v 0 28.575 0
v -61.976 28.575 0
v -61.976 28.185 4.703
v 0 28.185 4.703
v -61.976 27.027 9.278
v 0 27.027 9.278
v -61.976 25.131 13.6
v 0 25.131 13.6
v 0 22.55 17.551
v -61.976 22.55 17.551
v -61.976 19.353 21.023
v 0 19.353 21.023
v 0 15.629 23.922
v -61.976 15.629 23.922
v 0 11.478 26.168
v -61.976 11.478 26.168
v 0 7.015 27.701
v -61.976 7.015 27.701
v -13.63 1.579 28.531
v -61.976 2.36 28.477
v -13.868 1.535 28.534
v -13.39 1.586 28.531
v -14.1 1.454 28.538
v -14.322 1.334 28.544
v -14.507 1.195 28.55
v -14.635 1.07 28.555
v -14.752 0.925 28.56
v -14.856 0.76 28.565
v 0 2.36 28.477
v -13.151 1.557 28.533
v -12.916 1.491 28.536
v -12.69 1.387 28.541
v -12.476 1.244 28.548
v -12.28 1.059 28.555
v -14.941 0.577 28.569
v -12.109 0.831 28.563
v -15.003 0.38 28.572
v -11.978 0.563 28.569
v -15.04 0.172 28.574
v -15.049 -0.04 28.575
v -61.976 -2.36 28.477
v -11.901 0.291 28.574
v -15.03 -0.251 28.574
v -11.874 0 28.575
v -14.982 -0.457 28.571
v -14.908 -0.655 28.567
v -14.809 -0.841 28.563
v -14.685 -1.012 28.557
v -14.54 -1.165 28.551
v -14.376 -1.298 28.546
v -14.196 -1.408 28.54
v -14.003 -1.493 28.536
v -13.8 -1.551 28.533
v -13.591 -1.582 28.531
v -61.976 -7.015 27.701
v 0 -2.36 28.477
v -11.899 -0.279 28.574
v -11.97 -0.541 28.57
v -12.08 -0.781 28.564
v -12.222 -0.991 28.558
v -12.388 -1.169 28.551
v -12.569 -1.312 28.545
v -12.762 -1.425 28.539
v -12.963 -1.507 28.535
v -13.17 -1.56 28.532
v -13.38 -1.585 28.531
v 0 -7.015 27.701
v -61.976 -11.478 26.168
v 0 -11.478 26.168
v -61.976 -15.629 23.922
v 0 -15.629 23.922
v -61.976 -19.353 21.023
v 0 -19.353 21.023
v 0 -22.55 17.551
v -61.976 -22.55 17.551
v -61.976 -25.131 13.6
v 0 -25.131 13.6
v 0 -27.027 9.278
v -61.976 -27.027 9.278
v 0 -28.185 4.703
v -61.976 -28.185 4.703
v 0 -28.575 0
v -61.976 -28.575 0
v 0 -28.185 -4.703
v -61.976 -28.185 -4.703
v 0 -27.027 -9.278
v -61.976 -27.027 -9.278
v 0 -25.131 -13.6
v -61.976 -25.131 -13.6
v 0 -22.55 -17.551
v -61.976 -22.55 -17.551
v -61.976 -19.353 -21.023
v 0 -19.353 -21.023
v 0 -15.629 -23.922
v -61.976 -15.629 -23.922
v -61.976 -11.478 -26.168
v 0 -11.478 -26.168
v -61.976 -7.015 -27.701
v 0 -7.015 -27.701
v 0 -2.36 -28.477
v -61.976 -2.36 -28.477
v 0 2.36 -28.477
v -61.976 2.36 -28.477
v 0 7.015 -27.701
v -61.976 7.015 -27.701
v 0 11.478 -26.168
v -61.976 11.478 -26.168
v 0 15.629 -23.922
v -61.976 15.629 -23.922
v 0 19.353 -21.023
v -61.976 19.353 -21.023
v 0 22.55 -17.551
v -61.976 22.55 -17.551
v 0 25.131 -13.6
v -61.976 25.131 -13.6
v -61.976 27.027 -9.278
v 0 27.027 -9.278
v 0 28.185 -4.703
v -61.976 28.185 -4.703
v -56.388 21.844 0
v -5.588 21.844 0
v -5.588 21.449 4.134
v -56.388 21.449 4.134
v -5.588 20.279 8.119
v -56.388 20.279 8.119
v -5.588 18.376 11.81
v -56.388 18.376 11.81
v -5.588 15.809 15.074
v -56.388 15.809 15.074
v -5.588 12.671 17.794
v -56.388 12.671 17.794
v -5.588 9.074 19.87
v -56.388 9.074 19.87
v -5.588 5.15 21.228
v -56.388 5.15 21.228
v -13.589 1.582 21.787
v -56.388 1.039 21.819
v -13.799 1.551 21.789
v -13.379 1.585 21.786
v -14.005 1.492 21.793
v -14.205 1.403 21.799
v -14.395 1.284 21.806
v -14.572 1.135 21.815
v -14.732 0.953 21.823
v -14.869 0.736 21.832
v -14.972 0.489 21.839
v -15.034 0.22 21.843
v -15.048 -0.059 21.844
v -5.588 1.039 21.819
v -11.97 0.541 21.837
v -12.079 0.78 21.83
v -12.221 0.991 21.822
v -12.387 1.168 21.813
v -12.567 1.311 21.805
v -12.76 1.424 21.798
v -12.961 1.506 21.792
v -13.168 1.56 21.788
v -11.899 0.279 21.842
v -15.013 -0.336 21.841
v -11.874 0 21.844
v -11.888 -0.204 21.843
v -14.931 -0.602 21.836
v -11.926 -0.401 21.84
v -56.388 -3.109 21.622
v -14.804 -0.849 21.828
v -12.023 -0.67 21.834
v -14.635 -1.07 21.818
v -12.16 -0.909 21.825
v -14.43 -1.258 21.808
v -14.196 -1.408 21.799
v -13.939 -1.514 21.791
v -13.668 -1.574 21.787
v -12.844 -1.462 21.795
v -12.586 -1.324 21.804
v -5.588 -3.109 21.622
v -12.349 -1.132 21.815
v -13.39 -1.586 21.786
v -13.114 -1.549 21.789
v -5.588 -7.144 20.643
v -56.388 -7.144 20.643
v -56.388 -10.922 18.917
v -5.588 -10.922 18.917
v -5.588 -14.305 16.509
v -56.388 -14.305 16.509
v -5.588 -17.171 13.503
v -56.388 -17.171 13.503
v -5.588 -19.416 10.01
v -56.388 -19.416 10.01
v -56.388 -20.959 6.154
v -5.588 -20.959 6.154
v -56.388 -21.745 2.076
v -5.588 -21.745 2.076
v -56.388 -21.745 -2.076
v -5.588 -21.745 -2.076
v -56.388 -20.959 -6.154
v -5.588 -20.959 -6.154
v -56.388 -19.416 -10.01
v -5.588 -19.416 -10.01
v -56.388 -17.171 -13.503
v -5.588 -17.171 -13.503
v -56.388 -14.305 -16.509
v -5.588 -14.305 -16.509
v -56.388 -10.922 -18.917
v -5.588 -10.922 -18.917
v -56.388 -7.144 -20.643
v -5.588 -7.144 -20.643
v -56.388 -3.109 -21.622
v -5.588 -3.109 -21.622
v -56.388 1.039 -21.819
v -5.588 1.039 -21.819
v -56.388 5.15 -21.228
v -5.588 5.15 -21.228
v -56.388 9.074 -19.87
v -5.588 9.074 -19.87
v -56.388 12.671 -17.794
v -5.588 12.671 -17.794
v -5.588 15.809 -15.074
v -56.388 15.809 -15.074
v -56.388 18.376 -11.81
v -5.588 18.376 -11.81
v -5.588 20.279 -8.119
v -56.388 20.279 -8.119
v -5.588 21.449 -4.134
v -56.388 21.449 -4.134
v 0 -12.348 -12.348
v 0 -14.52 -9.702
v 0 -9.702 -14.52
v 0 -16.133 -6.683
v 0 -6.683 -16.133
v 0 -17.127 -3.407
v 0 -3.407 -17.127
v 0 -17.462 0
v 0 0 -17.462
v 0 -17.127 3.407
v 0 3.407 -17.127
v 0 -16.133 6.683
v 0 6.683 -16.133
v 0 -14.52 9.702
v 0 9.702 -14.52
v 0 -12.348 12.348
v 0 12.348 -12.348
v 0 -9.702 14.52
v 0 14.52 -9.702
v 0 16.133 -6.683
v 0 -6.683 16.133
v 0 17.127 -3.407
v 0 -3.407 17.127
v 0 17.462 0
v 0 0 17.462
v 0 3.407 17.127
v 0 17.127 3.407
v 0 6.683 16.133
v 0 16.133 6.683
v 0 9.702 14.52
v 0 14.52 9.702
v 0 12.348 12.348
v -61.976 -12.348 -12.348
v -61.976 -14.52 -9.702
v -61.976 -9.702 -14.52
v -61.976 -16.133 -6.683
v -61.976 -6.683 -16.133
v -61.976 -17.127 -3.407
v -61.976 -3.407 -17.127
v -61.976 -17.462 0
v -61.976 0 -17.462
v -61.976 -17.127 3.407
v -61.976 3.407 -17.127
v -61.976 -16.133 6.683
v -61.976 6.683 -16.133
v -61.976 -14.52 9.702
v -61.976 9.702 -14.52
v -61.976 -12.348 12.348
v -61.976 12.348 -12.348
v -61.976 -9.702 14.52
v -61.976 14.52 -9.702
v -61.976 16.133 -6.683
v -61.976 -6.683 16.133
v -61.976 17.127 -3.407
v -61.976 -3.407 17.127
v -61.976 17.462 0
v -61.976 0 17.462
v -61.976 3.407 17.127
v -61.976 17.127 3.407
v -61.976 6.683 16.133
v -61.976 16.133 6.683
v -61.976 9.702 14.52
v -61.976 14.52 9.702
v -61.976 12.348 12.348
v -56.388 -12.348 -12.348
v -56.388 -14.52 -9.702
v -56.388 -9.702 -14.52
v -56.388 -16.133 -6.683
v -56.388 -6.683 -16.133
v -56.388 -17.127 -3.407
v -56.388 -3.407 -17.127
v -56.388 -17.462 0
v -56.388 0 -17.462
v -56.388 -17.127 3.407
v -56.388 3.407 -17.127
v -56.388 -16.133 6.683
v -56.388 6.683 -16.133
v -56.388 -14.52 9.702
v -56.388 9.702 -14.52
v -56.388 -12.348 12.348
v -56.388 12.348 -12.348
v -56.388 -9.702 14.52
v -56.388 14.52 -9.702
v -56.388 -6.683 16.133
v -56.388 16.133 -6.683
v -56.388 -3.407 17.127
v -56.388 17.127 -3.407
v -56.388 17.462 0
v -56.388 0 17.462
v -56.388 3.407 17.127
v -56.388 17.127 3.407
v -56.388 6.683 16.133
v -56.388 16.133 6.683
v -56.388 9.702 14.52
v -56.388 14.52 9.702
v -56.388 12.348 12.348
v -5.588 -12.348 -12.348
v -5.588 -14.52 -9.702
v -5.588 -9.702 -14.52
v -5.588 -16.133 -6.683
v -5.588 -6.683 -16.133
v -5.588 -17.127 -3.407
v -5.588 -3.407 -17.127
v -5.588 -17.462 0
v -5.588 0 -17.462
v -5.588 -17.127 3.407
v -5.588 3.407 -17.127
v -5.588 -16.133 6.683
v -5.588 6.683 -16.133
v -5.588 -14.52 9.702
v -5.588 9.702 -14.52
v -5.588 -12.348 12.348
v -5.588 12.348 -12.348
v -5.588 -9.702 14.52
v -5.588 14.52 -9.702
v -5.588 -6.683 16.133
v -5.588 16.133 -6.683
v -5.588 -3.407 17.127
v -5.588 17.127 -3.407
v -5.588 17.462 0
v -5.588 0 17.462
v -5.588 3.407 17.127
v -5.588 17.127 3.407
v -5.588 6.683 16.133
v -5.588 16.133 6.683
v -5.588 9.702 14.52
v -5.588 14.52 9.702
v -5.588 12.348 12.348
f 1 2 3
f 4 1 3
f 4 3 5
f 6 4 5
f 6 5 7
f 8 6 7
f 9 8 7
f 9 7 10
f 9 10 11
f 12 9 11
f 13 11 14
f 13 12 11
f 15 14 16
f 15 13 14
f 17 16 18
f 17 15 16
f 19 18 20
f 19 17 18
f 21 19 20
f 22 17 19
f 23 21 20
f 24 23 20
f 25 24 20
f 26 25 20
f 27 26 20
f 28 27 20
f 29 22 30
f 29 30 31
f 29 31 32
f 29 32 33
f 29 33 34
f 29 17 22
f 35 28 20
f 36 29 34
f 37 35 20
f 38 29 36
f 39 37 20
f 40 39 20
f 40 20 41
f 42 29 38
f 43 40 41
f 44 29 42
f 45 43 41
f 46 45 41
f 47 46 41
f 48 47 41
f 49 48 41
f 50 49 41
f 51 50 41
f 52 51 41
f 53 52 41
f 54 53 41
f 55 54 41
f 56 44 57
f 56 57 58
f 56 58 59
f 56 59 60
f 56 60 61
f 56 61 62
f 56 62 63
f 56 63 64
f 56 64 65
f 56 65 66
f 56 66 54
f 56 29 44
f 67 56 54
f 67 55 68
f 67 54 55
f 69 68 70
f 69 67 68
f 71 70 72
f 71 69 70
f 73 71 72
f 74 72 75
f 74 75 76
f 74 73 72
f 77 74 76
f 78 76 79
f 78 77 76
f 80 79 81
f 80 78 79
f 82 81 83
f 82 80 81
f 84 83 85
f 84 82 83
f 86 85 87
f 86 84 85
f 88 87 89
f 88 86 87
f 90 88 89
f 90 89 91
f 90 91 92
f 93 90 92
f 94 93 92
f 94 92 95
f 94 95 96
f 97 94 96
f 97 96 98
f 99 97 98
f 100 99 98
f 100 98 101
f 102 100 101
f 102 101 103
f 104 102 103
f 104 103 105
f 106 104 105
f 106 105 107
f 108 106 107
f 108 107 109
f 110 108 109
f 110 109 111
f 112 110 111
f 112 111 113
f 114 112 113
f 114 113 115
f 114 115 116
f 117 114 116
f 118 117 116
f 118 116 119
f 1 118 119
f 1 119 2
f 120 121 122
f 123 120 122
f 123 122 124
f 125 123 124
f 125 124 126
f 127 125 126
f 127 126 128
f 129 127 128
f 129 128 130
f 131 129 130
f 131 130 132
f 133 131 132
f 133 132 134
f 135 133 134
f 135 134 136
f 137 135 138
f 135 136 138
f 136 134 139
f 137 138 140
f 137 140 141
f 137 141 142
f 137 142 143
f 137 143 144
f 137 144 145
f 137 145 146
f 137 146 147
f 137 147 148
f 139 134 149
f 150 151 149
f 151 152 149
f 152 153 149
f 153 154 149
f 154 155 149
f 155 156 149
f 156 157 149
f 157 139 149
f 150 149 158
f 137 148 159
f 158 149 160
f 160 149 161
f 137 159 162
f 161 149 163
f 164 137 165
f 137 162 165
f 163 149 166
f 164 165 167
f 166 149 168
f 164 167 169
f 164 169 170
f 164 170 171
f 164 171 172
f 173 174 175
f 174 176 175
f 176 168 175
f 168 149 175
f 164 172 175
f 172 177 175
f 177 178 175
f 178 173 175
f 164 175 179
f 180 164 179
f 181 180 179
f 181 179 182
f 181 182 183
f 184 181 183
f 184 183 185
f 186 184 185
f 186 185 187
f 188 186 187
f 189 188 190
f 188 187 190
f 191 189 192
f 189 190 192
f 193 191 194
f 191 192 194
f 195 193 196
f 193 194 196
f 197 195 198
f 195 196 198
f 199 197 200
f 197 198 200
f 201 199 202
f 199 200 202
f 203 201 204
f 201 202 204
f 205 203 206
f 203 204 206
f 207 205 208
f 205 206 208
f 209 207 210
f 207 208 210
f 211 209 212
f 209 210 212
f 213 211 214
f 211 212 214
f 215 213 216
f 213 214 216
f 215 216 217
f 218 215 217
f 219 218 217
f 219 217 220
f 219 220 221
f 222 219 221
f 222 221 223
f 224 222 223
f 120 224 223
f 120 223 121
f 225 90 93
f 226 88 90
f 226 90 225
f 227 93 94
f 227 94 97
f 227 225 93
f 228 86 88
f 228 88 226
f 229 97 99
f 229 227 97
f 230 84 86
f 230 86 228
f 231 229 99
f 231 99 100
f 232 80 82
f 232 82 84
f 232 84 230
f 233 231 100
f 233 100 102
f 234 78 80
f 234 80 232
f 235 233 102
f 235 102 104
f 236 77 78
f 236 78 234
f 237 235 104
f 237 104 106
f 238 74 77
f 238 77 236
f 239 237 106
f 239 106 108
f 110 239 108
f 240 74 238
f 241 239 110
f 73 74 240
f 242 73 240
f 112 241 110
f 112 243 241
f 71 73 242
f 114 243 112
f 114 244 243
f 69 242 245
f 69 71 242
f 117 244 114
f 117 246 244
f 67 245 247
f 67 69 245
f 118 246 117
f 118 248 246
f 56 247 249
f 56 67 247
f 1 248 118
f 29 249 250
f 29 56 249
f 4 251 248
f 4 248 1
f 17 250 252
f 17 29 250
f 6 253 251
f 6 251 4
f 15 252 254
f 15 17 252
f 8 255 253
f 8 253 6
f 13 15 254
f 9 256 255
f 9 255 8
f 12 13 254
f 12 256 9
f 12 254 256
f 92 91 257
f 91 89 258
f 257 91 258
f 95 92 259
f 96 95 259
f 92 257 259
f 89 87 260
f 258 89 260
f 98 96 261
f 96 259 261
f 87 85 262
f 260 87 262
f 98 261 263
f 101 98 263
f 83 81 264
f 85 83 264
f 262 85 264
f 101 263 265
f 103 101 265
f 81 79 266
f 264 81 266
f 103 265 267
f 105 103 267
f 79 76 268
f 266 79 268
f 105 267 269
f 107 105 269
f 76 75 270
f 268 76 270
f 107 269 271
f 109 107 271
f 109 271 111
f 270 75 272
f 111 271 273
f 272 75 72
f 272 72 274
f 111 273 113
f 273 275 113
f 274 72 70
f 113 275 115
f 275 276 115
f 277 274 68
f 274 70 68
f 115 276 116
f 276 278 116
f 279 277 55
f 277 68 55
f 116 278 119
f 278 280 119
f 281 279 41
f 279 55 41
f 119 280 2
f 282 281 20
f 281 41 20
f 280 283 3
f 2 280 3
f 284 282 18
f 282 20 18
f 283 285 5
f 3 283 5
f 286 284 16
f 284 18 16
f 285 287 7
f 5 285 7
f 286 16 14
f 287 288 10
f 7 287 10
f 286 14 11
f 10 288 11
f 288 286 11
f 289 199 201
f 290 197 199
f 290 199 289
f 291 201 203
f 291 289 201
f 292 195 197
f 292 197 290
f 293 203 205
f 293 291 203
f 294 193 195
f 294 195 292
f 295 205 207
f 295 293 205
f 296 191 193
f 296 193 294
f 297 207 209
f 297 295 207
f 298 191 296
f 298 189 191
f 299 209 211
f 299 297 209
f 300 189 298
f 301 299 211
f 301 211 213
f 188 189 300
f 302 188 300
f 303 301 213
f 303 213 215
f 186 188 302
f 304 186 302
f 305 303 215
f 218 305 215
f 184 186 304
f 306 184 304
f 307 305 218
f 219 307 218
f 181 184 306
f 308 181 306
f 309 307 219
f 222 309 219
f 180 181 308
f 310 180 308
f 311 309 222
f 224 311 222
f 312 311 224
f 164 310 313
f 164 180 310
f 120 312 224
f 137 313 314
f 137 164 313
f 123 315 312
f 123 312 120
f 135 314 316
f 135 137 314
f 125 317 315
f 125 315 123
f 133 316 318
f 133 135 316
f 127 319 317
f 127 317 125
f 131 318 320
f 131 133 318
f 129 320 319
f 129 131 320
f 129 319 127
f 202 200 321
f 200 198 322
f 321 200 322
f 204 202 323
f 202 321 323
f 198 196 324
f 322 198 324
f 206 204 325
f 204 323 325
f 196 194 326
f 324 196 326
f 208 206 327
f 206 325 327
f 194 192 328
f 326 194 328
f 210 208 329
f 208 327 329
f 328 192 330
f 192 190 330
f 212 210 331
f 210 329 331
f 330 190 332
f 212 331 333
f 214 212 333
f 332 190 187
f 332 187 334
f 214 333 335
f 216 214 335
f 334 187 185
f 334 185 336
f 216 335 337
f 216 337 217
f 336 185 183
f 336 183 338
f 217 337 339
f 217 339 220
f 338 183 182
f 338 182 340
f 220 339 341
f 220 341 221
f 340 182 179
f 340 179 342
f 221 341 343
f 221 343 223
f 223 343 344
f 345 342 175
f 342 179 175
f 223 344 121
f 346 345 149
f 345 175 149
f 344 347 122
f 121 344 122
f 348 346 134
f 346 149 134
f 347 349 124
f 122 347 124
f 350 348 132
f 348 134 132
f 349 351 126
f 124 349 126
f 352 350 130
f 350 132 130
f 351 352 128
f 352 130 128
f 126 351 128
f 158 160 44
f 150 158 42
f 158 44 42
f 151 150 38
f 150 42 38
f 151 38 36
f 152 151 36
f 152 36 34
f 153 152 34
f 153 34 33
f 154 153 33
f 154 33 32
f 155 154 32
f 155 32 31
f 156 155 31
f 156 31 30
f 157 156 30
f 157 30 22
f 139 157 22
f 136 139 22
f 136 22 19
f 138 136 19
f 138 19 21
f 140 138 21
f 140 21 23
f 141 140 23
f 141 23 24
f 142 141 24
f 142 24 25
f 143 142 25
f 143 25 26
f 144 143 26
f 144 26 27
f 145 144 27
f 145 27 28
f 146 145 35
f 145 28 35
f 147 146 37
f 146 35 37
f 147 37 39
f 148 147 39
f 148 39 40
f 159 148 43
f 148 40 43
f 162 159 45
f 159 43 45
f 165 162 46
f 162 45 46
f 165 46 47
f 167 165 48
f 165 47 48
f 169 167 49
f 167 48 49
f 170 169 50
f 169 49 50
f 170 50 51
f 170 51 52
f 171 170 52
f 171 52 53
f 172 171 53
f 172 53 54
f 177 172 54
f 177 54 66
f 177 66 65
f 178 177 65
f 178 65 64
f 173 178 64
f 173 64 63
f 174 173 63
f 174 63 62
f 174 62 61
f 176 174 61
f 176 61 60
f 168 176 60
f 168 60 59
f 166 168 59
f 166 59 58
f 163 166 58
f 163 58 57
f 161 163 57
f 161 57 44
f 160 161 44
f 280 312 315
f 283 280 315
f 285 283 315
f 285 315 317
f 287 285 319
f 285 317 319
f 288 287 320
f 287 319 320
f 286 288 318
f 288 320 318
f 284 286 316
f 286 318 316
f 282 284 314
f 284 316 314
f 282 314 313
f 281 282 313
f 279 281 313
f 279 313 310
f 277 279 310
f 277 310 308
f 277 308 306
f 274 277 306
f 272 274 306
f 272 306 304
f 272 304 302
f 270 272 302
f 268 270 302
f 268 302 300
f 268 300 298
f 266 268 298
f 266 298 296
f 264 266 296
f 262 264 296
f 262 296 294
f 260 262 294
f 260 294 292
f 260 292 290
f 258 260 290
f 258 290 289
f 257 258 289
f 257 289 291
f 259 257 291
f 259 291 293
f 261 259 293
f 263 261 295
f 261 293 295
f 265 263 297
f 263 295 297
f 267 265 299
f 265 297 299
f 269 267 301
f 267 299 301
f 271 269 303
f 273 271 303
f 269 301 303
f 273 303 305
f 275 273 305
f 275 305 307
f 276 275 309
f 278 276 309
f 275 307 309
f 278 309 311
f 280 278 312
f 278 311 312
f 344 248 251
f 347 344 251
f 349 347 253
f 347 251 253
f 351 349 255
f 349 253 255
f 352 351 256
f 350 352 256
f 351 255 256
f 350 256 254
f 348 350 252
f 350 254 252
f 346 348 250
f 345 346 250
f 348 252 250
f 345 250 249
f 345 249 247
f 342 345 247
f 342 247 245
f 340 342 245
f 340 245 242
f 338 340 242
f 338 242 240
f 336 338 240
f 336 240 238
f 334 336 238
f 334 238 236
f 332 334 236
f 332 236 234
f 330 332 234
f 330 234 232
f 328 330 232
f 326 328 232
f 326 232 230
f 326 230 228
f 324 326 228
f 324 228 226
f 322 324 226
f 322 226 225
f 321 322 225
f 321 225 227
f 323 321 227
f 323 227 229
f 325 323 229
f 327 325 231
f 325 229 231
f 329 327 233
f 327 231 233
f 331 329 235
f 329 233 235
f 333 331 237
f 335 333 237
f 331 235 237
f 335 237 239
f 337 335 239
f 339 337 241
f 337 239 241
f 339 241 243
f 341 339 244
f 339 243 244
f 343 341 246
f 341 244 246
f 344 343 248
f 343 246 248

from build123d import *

# Parameters (mm, degrees)
F0_R     = 28.575
F0_R_2   = 17.4625
F1_DEPTH = 61.976
F3_R     = 21.844
F4_DEPTH = 50.8
F7_R     = 1.5875
F8_DEPTH = 12.7


with BuildPart() as f1:
    # F0 (on Right) → F1 (new body)
    with BuildSketch(Plane.YZ):
        Circle(F0_R)
        Circle(F0_R_2, mode=Mode.SUBTRACT)
    extrude(amount=-F1_DEPTH)

    # F3 (on offset) → F4 (cut)
    with BuildSketch(Plane.YZ.offset(-5.588)):
        Circle(F3_R)
    extrude(amount=-F4_DEPTH, mode=Mode.SUBTRACT)

    # F7 (on face) → F8 (cut)
    with BuildSketch(Plane.XY.offset(28.575)):
        with Locations((-13.462, 0)):
            Circle(F7_R)
    extrude(amount=-F8_DEPTH, mode=Mode.SUBTRACT)


solid = f1.part
